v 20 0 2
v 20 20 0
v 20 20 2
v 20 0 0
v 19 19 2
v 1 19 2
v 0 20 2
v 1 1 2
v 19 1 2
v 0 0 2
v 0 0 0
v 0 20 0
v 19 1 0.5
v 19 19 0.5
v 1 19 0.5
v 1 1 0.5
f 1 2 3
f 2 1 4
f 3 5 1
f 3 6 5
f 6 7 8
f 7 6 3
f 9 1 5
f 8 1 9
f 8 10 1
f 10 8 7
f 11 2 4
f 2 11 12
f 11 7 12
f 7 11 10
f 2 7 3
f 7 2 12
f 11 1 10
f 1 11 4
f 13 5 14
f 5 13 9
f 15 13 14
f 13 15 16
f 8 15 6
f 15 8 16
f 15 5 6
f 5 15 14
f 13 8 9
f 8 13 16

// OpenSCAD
difference() {
	cube([20, 20, 2]);
	translate([1, 1, 0.5])
		cube([18, 18, 1.5]);
}
